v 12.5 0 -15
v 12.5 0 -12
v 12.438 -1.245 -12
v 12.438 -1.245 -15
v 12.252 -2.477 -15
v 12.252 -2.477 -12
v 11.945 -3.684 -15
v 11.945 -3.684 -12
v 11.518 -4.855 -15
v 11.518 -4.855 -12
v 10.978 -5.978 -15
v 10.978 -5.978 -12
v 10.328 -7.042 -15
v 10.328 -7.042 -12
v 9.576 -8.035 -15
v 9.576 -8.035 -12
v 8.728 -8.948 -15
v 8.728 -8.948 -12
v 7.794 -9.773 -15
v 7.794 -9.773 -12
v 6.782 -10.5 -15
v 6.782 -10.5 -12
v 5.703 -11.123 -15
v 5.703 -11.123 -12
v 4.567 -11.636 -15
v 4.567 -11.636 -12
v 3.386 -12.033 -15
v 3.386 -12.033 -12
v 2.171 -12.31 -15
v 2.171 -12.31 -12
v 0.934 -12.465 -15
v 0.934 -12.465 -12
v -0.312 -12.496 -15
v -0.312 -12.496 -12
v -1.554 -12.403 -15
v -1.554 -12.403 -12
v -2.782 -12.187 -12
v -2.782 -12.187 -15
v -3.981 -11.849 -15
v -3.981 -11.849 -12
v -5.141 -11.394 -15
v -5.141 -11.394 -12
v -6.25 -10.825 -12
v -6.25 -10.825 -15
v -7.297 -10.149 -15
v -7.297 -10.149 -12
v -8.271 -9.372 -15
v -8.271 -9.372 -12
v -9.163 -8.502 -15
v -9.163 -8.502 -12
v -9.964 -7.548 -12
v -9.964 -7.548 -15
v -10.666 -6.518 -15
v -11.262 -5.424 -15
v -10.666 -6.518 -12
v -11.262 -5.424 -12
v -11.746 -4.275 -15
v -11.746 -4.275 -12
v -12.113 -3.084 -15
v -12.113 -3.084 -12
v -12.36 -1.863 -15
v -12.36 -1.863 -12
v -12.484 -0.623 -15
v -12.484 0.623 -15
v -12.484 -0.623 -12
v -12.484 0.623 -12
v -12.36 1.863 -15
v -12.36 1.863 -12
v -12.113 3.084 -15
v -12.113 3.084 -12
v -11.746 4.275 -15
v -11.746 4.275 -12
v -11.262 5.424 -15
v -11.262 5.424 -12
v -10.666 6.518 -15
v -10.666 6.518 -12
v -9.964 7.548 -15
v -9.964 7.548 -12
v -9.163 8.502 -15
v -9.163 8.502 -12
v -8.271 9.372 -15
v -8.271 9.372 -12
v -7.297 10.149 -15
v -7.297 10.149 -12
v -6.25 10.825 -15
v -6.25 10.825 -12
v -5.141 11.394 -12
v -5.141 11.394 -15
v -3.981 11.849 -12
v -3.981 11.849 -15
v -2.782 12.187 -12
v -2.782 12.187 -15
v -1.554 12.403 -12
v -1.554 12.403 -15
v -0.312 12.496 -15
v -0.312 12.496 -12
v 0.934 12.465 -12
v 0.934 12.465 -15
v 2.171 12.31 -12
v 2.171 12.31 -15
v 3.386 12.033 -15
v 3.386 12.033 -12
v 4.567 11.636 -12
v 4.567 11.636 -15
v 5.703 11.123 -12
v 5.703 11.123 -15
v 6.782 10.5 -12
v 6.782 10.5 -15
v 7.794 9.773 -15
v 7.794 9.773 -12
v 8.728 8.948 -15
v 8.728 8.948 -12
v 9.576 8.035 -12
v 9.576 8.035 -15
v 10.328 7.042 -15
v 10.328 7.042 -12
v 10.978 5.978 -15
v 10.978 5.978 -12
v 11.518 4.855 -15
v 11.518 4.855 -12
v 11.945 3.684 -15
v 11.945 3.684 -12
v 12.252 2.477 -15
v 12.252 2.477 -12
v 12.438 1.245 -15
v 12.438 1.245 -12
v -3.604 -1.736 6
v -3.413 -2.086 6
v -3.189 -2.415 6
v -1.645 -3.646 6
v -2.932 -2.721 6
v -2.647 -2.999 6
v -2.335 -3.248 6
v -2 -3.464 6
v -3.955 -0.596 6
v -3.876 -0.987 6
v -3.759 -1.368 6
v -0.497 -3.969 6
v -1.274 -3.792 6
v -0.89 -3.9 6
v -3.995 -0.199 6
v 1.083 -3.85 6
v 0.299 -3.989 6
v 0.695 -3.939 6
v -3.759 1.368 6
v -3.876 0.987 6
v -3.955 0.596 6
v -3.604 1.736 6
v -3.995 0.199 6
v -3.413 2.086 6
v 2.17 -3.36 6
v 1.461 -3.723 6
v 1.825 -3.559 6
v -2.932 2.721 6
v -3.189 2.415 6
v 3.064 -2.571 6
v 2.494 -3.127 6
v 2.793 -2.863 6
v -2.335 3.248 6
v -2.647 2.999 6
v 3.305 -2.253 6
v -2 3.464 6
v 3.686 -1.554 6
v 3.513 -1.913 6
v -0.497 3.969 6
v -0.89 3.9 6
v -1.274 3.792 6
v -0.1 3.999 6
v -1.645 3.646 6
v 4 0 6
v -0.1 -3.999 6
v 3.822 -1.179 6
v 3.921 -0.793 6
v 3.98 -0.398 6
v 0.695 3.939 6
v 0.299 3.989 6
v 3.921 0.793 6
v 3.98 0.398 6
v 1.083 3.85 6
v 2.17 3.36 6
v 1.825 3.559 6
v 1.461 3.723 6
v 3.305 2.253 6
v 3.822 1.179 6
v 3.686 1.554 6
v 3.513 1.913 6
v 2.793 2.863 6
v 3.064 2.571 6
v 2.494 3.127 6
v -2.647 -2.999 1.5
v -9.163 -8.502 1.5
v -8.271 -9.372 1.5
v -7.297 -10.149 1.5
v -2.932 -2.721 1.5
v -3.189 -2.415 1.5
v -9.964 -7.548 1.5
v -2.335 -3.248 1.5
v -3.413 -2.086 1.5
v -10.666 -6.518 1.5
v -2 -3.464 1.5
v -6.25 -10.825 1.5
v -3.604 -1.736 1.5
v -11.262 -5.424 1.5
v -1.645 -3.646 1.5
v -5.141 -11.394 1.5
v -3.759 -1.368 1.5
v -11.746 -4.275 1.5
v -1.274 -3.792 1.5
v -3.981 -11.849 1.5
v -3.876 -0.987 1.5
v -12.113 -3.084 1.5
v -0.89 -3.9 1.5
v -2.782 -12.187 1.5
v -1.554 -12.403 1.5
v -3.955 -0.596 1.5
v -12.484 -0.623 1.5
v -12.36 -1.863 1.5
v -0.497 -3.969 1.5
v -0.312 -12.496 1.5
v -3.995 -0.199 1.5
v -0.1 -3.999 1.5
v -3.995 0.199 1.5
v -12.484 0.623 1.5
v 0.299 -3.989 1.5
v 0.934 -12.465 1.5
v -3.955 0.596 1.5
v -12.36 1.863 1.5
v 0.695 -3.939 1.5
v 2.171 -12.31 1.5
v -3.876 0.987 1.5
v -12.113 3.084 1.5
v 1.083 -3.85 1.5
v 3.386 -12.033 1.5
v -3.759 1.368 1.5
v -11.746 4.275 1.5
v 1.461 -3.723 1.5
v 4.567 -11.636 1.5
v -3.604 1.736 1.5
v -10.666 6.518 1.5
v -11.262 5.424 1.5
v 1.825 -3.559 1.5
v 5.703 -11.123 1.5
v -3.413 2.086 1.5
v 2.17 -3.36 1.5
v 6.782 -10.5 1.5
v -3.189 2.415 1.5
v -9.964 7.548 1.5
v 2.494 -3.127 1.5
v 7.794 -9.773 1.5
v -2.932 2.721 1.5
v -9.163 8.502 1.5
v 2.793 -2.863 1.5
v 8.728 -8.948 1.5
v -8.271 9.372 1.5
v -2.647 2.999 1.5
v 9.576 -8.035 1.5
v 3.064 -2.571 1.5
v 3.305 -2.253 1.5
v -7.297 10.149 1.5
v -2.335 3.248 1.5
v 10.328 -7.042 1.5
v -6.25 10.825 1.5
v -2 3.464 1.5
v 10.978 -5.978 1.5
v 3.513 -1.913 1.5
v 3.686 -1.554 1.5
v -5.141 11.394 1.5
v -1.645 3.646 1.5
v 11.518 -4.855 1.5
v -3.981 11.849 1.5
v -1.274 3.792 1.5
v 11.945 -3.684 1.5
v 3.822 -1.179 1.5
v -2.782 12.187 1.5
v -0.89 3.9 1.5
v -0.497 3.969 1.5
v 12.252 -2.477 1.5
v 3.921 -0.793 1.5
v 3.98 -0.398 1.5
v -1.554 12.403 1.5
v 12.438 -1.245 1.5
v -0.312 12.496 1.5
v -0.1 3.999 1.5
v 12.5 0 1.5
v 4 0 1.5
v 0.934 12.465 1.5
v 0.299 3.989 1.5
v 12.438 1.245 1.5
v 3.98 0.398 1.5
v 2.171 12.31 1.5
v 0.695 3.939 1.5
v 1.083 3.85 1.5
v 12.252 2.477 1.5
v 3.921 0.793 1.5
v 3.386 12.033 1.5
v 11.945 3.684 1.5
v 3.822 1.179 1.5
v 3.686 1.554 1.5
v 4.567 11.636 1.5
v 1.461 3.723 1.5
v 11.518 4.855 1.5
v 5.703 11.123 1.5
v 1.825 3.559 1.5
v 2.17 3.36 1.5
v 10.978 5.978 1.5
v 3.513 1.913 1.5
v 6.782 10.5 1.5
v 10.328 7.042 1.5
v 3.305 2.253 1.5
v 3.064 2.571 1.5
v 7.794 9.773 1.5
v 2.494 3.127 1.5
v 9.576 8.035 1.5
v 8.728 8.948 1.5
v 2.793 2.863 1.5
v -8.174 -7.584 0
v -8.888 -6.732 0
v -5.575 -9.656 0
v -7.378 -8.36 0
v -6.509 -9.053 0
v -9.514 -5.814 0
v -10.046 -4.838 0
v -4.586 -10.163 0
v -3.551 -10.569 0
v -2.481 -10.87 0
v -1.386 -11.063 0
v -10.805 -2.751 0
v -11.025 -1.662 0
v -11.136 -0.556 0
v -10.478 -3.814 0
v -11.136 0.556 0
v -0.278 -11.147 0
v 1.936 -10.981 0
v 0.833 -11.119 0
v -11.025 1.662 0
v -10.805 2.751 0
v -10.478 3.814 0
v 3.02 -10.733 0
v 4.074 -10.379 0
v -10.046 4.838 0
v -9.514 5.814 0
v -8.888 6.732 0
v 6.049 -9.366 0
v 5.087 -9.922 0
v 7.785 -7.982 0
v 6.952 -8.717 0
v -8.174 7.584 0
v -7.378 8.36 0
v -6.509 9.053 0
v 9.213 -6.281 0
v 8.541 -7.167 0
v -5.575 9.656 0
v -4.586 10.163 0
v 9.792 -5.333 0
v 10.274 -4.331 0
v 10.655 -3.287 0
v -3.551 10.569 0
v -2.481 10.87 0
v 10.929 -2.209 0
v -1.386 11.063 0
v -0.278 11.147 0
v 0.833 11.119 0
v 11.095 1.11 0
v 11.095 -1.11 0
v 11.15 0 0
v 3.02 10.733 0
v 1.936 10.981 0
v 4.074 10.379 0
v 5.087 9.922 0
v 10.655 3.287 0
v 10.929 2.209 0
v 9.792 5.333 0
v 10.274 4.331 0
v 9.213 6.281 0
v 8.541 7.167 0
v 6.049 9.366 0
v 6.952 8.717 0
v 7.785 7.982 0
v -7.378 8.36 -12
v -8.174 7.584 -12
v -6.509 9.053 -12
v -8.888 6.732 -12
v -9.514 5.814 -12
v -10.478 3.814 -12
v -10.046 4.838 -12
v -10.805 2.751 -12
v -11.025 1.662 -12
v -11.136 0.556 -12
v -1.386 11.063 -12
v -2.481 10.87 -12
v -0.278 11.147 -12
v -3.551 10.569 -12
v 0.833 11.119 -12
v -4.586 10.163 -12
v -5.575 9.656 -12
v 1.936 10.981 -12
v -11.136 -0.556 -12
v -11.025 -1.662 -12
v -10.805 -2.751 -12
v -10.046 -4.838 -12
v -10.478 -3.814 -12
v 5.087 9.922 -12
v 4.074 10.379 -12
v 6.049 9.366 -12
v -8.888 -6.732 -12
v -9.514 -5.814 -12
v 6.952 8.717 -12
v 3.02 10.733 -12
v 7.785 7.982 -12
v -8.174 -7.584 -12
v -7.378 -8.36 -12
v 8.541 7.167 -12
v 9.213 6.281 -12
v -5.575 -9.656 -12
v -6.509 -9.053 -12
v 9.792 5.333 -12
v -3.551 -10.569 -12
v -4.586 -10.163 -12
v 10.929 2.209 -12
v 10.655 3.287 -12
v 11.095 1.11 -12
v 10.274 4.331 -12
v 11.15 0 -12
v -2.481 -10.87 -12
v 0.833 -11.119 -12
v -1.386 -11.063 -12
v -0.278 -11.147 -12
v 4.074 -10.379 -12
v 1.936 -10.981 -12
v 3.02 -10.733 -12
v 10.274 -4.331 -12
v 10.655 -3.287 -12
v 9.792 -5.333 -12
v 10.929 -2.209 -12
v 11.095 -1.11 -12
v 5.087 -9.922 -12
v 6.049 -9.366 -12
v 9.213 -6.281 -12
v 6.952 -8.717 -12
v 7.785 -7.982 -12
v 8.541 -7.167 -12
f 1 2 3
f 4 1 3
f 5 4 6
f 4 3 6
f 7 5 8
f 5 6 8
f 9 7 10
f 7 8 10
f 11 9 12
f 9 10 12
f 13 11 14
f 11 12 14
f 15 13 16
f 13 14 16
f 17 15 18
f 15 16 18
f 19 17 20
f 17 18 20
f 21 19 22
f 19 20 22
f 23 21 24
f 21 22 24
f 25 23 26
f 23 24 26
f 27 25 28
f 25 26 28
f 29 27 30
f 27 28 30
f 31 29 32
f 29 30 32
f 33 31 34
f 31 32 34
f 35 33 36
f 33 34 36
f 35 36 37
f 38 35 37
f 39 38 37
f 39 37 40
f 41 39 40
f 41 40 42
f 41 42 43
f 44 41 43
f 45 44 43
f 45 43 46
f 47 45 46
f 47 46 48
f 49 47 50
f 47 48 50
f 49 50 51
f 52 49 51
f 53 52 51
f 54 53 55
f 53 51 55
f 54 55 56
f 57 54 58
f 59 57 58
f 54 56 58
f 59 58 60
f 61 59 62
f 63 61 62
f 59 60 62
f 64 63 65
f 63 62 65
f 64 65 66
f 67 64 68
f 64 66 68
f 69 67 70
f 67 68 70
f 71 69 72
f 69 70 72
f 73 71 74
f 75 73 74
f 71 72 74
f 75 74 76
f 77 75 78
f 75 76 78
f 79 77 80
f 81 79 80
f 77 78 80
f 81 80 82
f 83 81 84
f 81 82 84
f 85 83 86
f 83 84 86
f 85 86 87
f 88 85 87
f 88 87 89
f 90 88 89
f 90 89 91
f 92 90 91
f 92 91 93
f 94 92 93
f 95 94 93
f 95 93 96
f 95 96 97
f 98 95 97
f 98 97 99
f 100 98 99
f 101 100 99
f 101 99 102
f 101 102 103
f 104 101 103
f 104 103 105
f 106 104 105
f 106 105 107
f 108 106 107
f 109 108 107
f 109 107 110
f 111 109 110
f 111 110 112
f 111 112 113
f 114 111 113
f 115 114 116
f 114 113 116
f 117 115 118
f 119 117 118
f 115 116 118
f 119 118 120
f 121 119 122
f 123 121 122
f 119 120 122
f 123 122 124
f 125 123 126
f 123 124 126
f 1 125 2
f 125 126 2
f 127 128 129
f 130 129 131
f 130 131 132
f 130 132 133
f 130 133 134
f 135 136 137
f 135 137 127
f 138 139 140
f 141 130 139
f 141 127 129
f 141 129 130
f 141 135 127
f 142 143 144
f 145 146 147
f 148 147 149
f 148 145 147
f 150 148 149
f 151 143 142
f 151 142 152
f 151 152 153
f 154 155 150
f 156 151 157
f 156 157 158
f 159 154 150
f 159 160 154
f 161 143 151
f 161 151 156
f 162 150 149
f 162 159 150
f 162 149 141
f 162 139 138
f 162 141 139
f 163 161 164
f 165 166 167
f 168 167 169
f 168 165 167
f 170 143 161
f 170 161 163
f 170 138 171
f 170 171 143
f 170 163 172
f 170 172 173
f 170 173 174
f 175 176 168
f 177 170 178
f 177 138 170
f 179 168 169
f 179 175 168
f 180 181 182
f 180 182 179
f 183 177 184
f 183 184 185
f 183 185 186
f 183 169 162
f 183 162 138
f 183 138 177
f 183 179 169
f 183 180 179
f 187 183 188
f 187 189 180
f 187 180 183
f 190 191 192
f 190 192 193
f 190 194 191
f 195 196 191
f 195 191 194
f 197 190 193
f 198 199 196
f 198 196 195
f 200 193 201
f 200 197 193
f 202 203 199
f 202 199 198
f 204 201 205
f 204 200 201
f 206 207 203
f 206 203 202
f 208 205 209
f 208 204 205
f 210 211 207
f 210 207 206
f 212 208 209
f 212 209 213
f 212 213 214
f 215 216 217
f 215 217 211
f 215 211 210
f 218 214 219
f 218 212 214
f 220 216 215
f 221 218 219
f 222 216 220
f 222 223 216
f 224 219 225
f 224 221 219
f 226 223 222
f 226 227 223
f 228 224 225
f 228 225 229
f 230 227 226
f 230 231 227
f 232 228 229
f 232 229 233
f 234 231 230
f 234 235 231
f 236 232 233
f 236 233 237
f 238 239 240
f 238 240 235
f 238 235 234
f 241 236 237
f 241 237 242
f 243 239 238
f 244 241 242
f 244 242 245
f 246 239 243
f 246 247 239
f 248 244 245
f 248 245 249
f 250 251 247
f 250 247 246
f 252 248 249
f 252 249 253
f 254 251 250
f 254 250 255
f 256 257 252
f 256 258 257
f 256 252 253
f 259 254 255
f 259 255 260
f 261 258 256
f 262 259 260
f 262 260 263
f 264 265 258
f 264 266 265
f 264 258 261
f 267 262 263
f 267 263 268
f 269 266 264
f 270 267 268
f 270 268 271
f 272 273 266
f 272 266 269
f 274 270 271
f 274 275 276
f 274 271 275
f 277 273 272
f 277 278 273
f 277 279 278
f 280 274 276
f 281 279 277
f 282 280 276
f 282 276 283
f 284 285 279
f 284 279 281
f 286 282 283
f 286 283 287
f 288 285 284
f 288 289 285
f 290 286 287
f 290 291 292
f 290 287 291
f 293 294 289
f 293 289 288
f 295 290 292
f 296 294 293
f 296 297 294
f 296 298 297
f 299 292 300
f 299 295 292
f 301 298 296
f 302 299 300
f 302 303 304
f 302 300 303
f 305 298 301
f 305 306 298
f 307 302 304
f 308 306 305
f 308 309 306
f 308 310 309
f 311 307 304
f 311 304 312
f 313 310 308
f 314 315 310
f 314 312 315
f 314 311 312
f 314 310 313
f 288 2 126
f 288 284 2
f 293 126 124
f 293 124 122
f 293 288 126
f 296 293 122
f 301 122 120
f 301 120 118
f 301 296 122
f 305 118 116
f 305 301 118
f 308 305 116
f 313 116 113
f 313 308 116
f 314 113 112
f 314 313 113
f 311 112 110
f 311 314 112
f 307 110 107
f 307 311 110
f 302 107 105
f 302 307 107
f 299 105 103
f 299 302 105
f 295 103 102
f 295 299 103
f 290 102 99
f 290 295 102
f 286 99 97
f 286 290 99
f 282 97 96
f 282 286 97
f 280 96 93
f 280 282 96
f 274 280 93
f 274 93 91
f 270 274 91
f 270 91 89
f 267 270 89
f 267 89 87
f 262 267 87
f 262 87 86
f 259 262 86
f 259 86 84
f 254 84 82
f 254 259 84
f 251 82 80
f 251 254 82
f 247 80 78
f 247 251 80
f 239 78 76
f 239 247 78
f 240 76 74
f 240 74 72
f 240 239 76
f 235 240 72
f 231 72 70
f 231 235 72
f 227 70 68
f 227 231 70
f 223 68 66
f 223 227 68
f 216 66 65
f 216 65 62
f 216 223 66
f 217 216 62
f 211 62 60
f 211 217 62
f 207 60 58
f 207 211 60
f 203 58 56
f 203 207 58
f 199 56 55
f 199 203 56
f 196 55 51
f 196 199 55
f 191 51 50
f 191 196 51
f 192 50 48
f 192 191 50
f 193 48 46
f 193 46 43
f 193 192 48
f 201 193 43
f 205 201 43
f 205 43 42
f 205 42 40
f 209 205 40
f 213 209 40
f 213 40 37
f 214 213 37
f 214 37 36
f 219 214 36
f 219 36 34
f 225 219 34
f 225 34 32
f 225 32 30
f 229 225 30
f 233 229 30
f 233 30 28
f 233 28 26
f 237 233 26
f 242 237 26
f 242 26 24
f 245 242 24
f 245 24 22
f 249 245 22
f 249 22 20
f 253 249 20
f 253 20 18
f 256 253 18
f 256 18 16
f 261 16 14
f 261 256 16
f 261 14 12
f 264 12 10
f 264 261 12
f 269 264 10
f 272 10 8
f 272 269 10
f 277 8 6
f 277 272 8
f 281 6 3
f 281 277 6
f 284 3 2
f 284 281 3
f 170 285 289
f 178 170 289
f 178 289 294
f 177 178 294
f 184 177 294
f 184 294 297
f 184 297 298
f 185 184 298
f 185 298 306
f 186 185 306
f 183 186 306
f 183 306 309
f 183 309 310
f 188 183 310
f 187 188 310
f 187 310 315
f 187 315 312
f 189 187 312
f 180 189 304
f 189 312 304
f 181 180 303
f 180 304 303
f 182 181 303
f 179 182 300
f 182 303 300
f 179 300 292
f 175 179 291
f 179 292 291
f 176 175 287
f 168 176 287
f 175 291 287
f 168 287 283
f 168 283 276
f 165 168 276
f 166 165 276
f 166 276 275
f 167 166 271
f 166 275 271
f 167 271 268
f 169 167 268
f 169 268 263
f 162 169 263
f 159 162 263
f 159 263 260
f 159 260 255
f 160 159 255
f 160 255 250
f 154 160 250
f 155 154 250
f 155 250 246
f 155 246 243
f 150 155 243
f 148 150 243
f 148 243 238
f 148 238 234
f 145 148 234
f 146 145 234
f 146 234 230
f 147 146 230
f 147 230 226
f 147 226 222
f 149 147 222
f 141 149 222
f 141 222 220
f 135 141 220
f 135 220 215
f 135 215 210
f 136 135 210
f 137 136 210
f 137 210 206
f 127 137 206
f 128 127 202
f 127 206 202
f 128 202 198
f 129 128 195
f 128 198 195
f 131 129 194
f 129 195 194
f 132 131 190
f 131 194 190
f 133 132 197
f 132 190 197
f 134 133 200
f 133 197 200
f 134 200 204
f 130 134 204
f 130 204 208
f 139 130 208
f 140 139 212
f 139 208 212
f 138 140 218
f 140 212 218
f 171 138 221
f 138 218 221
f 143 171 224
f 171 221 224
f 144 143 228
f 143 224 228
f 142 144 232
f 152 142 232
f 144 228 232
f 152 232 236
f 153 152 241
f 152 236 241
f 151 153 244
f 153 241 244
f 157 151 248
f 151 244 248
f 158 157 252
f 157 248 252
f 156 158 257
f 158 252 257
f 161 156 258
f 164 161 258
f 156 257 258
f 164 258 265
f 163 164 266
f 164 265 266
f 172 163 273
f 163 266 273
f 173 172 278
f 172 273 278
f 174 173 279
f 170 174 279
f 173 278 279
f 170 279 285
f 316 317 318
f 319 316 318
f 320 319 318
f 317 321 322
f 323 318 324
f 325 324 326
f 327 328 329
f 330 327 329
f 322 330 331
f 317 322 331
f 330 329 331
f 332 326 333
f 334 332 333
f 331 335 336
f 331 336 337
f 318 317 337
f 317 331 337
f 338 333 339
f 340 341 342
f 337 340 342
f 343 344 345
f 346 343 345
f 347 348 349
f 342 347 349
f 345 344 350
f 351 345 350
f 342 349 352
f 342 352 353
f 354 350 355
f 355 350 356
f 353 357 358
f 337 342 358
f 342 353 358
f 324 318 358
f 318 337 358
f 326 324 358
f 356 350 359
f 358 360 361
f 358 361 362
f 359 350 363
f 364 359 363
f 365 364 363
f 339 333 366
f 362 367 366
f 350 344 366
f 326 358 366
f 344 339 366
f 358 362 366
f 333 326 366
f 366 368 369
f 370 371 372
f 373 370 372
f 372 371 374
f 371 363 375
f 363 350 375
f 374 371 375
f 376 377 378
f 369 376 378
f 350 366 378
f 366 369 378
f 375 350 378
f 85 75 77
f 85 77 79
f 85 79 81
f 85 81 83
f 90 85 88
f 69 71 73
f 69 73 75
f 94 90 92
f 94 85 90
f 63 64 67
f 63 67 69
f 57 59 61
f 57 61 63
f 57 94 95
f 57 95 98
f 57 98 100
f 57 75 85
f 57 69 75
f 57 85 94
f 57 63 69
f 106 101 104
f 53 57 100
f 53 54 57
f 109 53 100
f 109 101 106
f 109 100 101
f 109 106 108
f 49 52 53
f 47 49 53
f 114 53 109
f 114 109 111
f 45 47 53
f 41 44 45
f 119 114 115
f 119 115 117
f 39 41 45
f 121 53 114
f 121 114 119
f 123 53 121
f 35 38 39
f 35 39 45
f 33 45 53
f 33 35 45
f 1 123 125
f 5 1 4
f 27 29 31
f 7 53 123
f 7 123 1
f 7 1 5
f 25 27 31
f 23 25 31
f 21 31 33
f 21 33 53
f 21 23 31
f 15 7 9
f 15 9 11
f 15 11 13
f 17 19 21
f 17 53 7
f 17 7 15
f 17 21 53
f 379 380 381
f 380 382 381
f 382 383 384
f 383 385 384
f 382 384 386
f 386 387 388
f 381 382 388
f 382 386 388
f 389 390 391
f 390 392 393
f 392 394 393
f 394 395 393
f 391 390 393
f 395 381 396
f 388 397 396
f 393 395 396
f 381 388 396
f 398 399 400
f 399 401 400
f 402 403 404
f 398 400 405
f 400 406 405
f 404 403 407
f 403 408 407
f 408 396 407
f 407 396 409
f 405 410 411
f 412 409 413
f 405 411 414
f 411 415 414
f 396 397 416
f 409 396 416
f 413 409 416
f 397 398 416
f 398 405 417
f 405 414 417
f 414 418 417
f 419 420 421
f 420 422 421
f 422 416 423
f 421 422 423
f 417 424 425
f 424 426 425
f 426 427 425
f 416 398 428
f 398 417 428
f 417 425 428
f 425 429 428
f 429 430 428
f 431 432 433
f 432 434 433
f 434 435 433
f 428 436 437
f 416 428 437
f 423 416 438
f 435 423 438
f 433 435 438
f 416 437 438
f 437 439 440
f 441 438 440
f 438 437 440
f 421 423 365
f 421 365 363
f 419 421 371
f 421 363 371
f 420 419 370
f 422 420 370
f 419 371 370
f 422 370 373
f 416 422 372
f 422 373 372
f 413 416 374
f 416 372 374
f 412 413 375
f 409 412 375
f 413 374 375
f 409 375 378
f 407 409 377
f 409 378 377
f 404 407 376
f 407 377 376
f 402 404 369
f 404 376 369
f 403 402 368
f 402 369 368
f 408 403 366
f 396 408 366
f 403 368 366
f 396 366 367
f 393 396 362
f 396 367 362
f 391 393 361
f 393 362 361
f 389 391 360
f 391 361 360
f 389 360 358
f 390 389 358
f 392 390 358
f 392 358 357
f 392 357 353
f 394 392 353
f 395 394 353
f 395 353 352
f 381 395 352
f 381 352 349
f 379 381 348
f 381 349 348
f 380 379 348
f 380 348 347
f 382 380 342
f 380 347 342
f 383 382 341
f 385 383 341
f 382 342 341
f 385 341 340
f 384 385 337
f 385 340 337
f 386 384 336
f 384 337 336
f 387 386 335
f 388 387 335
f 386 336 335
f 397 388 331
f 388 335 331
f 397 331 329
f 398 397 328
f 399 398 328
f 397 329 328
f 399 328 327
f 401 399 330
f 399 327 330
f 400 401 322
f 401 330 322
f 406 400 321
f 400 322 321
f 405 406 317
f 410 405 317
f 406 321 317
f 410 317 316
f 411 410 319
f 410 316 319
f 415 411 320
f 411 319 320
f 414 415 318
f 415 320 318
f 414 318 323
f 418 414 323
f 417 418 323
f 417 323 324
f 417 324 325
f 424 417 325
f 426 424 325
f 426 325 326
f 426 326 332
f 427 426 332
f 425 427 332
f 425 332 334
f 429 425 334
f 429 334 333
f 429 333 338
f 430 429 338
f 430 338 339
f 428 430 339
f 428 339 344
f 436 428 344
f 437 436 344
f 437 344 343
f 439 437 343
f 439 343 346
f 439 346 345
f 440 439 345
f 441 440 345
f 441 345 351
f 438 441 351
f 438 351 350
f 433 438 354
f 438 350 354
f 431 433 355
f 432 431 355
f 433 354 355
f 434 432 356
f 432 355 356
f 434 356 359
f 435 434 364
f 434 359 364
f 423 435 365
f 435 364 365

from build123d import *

# Parameters (mm, degrees)
F0_R     = 8.5
F0_R_2   = 4
F1_DEPTH = 1.5
F2_DEPTH = 6
F0_R_3   = 12.5
F0_R_4   = 11.15
F3_DEPTH = 1.5
F4_DEPTH = 12
F5_R     = 12.5
F6_DEPTH = 3


with BuildPart() as f1:
    # F0 (on Top) → F1 (new body)
    with BuildSketch(Plane.XY):
        Circle(F0_R)
        Circle(F0_R_2, mode=Mode.SUBTRACT)
    extrude(amount=F1_DEPTH)

    # F0 (on Top) → F2 (join)
    with BuildSketch(Plane.XY):
        Circle(F0_R_2)
    extrude(amount=F2_DEPTH)

    # F0 (on Top) → F3 (join)
    with BuildSketch(Plane.XY):
        Circle(F0_R_3)
        Circle(F0_R_4, mode=Mode.SUBTRACT)
        Circle(F0_R_4)
        Circle(F0_R, mode=Mode.SUBTRACT)
    extrude(amount=F3_DEPTH)

    # F0 (on Top) → F4 (join)
    with BuildSketch(Plane.XY):
        Circle(F0_R_3)
        Circle(F0_R_4, mode=Mode.SUBTRACT)
    extrude(amount=-F4_DEPTH)

    # F5 (on face) → F6 (join)
    with BuildSketch(Plane(origin=(0, 0, -12), x_dir=(1, 0, 0), z_dir=(0, 0, -1))):
        Circle(F5_R)
    extrude(amount=F6_DEPTH)


solid = f1.part
